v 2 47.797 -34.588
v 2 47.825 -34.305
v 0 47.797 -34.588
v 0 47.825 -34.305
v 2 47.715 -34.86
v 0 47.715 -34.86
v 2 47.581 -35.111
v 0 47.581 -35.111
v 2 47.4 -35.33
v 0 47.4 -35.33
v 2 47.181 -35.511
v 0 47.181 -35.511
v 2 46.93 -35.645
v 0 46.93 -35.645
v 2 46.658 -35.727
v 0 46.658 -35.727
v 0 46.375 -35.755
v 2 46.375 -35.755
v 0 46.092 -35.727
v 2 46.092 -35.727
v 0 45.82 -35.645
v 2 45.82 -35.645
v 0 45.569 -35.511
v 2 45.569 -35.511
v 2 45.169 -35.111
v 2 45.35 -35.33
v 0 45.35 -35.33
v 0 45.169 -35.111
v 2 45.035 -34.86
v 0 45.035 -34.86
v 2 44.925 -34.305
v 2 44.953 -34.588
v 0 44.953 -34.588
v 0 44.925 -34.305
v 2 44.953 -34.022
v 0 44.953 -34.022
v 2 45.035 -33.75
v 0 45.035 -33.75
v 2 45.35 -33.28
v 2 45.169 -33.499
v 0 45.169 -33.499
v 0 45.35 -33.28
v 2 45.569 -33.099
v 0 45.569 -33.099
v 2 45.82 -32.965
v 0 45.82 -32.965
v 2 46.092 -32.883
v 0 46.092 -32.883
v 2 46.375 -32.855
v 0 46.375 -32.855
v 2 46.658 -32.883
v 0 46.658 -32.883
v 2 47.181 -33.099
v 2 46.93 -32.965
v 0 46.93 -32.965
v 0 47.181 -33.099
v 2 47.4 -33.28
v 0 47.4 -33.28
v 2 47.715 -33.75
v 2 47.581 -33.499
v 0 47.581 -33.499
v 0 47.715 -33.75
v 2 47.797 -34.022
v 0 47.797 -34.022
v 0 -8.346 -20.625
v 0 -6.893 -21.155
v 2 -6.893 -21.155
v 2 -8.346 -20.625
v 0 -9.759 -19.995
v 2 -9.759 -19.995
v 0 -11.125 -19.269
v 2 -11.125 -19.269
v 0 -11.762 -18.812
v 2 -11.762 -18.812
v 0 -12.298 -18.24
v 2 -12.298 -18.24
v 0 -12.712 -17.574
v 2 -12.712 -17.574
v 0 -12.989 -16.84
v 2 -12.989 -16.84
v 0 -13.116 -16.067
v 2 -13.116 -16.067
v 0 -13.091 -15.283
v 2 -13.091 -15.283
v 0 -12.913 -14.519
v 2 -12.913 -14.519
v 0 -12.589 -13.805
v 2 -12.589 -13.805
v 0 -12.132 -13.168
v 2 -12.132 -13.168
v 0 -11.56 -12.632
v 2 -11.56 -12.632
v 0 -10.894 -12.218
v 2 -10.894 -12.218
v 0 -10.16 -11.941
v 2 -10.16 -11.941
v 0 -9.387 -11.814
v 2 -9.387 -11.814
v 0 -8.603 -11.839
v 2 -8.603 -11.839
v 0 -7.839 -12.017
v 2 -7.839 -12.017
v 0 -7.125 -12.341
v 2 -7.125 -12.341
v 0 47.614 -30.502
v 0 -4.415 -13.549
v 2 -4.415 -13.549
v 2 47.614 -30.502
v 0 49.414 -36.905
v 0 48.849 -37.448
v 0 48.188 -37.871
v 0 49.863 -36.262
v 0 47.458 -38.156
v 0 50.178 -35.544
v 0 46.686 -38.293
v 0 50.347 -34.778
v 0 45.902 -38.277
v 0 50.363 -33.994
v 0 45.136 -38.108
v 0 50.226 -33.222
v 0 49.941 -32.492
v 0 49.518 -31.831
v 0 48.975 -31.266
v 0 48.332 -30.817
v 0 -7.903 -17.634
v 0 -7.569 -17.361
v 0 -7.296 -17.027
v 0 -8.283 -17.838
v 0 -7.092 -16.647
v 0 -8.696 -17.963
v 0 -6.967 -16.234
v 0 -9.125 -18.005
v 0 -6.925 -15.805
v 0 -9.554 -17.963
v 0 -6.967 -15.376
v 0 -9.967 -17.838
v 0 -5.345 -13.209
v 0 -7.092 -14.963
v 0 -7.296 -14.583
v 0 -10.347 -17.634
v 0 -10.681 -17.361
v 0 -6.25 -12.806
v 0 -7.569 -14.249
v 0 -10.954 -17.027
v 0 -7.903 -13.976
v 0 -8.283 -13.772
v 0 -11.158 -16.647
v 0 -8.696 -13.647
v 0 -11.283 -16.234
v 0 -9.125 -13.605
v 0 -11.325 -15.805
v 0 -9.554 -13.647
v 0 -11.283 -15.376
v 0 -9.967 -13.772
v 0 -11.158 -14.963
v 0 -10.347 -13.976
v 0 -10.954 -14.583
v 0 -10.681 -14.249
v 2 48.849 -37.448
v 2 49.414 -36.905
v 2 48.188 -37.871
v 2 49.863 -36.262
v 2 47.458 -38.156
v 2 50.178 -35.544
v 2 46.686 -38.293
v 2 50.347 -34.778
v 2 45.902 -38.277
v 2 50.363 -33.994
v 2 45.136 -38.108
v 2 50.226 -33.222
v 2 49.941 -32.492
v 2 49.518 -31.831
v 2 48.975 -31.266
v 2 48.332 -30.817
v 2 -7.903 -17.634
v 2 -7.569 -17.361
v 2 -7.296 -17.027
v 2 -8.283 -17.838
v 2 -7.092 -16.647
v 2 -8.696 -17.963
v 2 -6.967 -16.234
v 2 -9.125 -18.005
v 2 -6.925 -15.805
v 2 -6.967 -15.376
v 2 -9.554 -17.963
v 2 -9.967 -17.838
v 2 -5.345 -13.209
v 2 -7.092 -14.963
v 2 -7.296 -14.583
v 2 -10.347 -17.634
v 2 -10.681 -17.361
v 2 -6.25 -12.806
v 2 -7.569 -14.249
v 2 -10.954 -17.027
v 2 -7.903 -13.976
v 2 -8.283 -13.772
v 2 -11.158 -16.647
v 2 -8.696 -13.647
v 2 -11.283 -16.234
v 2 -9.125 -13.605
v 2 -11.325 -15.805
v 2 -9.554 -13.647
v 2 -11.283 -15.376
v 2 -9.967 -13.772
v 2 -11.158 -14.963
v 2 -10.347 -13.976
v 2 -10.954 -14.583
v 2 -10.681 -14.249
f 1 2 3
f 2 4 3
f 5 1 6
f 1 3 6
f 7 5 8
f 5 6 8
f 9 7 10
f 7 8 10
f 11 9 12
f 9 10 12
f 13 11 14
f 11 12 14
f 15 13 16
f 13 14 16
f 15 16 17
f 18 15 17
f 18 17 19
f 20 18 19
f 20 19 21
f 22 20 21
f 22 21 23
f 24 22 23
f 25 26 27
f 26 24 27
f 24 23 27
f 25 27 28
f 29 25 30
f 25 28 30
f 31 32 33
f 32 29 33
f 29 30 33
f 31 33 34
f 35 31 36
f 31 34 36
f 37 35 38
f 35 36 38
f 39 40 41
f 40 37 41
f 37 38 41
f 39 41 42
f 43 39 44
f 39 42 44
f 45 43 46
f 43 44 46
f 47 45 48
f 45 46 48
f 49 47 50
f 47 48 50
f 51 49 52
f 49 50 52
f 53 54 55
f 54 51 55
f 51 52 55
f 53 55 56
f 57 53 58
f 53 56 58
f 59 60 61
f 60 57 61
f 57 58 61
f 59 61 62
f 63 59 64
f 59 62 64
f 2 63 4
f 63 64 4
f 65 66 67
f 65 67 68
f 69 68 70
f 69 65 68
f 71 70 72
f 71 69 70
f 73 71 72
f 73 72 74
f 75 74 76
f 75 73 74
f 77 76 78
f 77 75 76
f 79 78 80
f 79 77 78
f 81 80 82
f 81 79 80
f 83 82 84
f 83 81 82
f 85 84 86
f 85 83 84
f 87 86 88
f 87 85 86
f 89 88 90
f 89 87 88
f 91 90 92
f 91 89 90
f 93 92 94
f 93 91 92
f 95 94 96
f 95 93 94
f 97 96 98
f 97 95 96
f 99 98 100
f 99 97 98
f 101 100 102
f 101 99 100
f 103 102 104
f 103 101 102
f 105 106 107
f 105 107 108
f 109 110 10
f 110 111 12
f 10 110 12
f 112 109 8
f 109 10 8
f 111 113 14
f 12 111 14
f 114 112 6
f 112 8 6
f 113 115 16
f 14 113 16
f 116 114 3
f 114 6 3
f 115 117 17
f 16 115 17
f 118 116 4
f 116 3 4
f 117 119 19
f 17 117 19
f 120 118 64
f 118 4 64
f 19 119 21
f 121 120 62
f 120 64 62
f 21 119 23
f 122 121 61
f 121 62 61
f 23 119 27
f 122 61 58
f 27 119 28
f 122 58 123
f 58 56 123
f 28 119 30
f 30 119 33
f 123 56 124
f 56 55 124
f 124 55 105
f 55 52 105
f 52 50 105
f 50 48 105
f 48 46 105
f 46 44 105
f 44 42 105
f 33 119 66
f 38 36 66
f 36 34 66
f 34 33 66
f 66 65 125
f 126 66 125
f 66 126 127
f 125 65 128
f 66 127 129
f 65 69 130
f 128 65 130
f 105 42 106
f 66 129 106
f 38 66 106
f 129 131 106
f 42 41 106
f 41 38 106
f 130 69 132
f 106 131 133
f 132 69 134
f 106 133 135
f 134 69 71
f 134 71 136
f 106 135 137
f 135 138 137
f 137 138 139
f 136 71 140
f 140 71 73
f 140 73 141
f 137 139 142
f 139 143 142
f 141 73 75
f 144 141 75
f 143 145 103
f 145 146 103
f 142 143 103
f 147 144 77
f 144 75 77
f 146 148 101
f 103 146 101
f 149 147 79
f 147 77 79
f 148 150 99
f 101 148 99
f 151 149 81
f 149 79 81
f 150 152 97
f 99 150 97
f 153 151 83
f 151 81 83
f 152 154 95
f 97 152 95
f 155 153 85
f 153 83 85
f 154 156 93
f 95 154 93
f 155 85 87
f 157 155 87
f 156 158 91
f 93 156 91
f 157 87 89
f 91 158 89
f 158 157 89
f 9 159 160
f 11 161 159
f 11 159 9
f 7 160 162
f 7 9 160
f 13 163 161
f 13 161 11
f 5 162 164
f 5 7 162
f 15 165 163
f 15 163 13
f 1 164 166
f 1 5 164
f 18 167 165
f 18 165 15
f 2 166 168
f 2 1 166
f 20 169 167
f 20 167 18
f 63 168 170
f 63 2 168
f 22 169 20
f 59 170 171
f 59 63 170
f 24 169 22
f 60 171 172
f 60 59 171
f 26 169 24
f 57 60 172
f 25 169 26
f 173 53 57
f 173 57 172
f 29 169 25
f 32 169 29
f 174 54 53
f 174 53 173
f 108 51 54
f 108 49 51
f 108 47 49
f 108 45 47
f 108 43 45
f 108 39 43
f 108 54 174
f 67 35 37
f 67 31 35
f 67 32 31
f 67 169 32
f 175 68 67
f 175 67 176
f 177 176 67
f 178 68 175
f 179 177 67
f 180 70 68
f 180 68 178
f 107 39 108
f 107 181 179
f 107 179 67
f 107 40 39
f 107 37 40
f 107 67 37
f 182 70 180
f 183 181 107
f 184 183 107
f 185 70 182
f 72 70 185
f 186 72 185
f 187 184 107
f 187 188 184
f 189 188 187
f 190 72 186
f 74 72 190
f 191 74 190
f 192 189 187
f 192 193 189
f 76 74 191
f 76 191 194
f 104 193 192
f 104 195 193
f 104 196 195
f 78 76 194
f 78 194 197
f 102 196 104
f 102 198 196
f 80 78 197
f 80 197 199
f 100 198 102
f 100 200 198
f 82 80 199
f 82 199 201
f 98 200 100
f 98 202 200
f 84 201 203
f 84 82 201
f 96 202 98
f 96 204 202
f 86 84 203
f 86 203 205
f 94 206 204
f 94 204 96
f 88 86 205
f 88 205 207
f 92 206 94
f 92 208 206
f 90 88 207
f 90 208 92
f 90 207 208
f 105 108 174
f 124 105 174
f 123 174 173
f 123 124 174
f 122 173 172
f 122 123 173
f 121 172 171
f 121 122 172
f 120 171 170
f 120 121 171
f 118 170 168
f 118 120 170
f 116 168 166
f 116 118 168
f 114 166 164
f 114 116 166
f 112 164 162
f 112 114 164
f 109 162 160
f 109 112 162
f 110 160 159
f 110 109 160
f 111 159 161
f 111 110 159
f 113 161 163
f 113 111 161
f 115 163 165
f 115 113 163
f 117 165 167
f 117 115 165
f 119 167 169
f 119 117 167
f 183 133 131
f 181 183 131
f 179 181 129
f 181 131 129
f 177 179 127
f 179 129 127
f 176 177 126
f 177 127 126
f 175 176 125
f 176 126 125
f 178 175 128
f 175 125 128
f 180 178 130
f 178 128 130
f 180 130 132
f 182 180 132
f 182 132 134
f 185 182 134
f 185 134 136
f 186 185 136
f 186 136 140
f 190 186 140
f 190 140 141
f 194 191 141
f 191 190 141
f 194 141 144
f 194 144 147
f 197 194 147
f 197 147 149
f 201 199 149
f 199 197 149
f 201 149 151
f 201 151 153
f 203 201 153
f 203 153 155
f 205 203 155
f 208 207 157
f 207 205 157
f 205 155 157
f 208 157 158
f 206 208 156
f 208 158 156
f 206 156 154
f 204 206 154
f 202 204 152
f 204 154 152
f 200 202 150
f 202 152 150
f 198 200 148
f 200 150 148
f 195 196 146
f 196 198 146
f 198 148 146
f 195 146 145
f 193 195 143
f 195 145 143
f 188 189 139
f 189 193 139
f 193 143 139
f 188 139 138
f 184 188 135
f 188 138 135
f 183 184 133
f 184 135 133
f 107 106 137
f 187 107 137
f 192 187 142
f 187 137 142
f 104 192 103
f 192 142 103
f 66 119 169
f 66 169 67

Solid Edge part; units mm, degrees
sketch "Sketch1" plane through (0, 0, 0) normal (1, 0, 0) x (0, 1, 0)
  arc A0 (-7.125, -12.3409) -> (-11.125, -19.2691) centre (-9.125, -15.805) ccw
  arc A1 (-6.8931, -21.1553) -> (-11.125, -19.2691) centre (0, 0) cw
  line L0 (45.1358, -38.1082) -> (-6.8931, -21.1553)
  arc A2 (47.6142, -30.5018) -> (45.1358, -38.1082) centre (46.375, -34.305) cw
  line L1 (-4.4147, -13.5489) -> (47.6142, -30.5018)
  arc A3 (-4.4147, -13.5489) -> (-7.125, -12.3409) centre (0, 0) cw
  circle A4 centre (-9.125, -15.805) radius 2.2
  circle A5 centre (46.375, -34.305) radius 1.45
  dimension "D1" = 4.4
  dimension "D2" = 2.9
extrude "Protrusion1" add sketch "Sketch1" along normal blind 2
